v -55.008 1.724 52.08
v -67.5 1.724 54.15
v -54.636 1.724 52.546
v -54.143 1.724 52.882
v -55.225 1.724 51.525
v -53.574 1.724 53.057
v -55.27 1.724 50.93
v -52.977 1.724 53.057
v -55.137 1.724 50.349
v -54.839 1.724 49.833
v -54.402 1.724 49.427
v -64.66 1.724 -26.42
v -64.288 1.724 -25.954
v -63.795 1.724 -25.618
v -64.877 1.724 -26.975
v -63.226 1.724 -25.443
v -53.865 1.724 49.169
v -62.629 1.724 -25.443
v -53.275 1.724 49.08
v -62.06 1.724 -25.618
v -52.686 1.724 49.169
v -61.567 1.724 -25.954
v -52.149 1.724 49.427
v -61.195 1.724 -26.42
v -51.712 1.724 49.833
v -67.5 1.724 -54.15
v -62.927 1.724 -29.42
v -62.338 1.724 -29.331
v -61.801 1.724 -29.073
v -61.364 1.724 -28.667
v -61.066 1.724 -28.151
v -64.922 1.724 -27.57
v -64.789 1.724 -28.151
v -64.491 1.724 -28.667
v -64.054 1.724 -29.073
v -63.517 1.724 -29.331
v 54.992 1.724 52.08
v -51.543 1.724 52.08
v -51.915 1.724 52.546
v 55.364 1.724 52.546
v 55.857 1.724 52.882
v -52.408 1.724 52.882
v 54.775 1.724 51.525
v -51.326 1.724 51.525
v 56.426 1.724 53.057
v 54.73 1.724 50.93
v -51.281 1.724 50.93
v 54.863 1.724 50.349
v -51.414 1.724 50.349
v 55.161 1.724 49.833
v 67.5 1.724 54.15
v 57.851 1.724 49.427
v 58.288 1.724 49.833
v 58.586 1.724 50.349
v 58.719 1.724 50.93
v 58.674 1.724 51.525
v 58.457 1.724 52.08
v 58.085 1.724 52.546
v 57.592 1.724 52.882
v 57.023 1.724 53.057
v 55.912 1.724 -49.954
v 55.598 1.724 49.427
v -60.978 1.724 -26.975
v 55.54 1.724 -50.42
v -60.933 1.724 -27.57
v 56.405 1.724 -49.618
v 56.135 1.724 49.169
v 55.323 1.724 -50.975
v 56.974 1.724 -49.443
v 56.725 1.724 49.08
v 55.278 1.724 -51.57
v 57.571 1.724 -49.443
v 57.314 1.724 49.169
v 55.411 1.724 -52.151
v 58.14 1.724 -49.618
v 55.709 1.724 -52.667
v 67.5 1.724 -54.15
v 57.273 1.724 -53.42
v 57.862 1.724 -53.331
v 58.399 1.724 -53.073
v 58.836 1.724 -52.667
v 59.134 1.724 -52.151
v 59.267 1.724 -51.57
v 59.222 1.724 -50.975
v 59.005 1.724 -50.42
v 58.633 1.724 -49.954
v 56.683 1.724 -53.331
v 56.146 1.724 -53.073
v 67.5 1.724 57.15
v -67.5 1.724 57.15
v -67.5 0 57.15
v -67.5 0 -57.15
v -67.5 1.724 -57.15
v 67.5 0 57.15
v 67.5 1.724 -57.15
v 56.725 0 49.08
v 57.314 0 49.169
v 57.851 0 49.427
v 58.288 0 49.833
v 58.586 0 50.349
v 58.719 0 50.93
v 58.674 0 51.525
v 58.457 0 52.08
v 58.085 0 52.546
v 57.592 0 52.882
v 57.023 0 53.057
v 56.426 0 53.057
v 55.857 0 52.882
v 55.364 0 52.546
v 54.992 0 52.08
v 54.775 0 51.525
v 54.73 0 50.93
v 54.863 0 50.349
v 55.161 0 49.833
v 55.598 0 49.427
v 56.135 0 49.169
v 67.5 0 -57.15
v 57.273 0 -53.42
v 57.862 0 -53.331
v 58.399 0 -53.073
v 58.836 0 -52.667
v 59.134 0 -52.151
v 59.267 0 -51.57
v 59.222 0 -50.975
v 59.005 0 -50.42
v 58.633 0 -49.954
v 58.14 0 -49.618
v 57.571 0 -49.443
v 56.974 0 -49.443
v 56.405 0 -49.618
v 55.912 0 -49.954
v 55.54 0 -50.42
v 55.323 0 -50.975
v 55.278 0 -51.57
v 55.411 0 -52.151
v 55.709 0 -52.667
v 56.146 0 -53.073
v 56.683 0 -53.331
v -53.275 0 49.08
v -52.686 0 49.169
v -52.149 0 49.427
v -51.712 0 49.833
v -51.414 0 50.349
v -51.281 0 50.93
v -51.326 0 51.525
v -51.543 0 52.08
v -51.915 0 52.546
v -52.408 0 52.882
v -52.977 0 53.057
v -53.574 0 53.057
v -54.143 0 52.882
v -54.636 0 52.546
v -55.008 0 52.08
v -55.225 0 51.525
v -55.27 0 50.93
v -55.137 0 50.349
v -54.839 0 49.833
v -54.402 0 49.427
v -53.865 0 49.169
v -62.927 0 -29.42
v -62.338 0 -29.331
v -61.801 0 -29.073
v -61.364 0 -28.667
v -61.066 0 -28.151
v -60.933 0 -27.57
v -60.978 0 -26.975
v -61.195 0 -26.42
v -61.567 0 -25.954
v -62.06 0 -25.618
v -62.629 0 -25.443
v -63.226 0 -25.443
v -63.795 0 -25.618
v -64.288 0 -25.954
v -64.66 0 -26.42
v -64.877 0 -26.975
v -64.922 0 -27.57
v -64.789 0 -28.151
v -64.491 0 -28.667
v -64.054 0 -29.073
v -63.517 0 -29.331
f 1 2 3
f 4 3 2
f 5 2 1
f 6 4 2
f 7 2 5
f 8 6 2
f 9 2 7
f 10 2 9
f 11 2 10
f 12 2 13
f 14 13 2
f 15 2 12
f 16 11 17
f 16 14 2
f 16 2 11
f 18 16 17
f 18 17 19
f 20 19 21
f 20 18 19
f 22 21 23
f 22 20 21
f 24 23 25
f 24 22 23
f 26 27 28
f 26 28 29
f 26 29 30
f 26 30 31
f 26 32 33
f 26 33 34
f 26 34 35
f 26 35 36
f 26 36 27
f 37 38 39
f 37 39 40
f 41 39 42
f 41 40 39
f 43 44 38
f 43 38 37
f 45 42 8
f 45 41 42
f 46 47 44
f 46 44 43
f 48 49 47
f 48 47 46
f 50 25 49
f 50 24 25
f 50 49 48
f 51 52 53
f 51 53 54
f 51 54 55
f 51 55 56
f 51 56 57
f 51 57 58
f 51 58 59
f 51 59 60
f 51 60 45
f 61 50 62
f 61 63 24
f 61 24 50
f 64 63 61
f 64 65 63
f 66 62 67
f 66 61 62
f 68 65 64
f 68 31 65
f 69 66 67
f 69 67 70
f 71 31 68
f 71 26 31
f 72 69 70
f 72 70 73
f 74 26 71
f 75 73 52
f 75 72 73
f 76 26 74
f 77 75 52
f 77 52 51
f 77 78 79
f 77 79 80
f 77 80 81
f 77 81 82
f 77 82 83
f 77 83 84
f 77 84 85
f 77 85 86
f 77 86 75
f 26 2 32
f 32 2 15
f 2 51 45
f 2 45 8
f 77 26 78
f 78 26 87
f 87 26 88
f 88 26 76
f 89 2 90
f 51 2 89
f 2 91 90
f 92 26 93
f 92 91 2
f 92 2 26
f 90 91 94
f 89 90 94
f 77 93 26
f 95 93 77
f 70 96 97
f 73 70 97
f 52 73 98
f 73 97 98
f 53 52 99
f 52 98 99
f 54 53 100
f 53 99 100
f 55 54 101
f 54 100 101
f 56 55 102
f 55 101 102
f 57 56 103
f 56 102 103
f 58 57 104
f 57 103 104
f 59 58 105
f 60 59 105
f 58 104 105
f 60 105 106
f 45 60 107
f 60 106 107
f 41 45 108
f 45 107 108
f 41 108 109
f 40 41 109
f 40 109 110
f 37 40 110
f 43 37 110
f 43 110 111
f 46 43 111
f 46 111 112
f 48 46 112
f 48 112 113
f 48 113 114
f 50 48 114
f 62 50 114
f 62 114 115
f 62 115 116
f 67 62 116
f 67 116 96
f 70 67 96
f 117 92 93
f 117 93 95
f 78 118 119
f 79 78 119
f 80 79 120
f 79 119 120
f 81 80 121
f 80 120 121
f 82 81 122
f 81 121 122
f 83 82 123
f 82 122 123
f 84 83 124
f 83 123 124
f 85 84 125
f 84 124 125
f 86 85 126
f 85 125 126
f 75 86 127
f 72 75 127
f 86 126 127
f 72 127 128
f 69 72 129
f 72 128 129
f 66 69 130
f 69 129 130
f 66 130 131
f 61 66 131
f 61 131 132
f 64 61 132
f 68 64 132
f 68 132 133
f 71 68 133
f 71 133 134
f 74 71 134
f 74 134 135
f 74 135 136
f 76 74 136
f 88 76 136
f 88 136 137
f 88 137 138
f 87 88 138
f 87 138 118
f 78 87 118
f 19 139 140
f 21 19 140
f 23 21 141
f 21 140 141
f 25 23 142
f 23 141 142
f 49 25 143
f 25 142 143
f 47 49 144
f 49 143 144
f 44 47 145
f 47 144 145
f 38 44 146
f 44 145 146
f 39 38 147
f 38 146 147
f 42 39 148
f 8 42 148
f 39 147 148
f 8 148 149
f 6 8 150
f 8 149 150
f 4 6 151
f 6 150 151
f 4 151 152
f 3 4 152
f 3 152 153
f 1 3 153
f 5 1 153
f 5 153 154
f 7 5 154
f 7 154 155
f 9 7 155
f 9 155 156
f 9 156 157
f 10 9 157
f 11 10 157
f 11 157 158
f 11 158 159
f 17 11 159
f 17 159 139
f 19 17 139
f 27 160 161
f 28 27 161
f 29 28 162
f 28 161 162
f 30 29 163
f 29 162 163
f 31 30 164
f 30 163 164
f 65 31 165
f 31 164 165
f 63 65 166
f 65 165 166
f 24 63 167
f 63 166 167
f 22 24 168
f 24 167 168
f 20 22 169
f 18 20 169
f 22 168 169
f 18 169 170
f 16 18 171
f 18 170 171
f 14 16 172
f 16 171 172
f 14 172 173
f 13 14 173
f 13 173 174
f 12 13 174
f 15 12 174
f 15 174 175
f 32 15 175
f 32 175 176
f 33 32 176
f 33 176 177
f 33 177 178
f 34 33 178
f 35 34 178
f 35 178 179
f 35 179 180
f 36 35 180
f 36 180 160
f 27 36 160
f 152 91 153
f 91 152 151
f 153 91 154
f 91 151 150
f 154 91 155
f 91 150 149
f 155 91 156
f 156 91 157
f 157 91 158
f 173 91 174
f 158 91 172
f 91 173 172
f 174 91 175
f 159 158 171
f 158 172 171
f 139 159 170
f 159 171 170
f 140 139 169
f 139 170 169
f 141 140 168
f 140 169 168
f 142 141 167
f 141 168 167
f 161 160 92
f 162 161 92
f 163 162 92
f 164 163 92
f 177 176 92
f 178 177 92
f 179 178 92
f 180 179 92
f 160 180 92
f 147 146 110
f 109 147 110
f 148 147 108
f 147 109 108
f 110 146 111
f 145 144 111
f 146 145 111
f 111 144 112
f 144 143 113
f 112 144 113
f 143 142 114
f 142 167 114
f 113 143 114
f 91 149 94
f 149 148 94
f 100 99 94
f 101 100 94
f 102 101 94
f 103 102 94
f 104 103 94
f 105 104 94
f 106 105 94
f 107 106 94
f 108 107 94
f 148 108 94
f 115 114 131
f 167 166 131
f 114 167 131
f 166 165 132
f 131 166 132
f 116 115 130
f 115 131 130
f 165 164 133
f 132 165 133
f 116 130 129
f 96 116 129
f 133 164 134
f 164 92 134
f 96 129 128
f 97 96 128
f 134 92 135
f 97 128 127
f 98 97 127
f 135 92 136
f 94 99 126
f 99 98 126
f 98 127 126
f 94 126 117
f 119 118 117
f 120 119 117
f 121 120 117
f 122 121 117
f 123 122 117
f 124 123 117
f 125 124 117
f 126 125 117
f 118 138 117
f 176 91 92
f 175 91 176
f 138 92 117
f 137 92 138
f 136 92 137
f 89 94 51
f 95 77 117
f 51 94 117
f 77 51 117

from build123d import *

# Parameters (mm, degrees)
SKETCH1_W           = 135
SKETCH1_H           = 114.3
BOSS_EXTRUDE1_DEPTH = 1.724
SKETCH3_W           = 135
SKETCH3_H           = 3
CUT_EXTRUDE2_DEPTH  = 0.0001
SKETCH4_R           = 2
CUT_EXTRUDE3_DEPTH  = 89.460978267


with BuildPart() as part:
    # Sketch1 → Boss-Extrude1 (new body)
    with BuildSketch(Plane(origin=(0, 0, 0), x_dir=(1, 0, 0), z_dir=(0, 1, 0))):
        Rectangle(SKETCH1_W, SKETCH1_H)
    extrude(amount=BOSS_EXTRUDE1_DEPTH)

    # Sketch3 → Cut-Extrude2 (cut)
    with BuildSketch(Plane(origin=(0, 1.724, 0), x_dir=(1, 0, 0), z_dir=(0, 1, 0))):
        with Locations((0, 55.65)):
            Rectangle(SKETCH3_W, SKETCH3_H)
        with Locations((0, -55.65)):
            Rectangle(SKETCH3_W, SKETCH3_H)
    extrude(amount=-CUT_EXTRUDE2_DEPTH, mode=Mode.SUBTRACT)

    # Sketch4 → Cut-Extrude3 (cut, through all)
    with BuildSketch(Plane.XZ):
        with Locations(Location((-53.275487911, 51.079761641, 0), (0, 0, 270))):
            Circle(SKETCH4_R)
        with Locations(Location((56.724512089, 51.079761641, 0), (0, 0, 270))):
            Circle(SKETCH4_R)
        with Locations(Location((57.272512089, -51.420238359, 0), (0, 0, 270))):
            Circle(SKETCH4_R)
        with Locations(Location((-62.927487911, -27.420238359, 0), (0, 0, 270))):
            Circle(SKETCH4_R)
    extrude(amount=-CUT_EXTRUDE3_DEPTH, mode=Mode.SUBTRACT)


solid = part.part
